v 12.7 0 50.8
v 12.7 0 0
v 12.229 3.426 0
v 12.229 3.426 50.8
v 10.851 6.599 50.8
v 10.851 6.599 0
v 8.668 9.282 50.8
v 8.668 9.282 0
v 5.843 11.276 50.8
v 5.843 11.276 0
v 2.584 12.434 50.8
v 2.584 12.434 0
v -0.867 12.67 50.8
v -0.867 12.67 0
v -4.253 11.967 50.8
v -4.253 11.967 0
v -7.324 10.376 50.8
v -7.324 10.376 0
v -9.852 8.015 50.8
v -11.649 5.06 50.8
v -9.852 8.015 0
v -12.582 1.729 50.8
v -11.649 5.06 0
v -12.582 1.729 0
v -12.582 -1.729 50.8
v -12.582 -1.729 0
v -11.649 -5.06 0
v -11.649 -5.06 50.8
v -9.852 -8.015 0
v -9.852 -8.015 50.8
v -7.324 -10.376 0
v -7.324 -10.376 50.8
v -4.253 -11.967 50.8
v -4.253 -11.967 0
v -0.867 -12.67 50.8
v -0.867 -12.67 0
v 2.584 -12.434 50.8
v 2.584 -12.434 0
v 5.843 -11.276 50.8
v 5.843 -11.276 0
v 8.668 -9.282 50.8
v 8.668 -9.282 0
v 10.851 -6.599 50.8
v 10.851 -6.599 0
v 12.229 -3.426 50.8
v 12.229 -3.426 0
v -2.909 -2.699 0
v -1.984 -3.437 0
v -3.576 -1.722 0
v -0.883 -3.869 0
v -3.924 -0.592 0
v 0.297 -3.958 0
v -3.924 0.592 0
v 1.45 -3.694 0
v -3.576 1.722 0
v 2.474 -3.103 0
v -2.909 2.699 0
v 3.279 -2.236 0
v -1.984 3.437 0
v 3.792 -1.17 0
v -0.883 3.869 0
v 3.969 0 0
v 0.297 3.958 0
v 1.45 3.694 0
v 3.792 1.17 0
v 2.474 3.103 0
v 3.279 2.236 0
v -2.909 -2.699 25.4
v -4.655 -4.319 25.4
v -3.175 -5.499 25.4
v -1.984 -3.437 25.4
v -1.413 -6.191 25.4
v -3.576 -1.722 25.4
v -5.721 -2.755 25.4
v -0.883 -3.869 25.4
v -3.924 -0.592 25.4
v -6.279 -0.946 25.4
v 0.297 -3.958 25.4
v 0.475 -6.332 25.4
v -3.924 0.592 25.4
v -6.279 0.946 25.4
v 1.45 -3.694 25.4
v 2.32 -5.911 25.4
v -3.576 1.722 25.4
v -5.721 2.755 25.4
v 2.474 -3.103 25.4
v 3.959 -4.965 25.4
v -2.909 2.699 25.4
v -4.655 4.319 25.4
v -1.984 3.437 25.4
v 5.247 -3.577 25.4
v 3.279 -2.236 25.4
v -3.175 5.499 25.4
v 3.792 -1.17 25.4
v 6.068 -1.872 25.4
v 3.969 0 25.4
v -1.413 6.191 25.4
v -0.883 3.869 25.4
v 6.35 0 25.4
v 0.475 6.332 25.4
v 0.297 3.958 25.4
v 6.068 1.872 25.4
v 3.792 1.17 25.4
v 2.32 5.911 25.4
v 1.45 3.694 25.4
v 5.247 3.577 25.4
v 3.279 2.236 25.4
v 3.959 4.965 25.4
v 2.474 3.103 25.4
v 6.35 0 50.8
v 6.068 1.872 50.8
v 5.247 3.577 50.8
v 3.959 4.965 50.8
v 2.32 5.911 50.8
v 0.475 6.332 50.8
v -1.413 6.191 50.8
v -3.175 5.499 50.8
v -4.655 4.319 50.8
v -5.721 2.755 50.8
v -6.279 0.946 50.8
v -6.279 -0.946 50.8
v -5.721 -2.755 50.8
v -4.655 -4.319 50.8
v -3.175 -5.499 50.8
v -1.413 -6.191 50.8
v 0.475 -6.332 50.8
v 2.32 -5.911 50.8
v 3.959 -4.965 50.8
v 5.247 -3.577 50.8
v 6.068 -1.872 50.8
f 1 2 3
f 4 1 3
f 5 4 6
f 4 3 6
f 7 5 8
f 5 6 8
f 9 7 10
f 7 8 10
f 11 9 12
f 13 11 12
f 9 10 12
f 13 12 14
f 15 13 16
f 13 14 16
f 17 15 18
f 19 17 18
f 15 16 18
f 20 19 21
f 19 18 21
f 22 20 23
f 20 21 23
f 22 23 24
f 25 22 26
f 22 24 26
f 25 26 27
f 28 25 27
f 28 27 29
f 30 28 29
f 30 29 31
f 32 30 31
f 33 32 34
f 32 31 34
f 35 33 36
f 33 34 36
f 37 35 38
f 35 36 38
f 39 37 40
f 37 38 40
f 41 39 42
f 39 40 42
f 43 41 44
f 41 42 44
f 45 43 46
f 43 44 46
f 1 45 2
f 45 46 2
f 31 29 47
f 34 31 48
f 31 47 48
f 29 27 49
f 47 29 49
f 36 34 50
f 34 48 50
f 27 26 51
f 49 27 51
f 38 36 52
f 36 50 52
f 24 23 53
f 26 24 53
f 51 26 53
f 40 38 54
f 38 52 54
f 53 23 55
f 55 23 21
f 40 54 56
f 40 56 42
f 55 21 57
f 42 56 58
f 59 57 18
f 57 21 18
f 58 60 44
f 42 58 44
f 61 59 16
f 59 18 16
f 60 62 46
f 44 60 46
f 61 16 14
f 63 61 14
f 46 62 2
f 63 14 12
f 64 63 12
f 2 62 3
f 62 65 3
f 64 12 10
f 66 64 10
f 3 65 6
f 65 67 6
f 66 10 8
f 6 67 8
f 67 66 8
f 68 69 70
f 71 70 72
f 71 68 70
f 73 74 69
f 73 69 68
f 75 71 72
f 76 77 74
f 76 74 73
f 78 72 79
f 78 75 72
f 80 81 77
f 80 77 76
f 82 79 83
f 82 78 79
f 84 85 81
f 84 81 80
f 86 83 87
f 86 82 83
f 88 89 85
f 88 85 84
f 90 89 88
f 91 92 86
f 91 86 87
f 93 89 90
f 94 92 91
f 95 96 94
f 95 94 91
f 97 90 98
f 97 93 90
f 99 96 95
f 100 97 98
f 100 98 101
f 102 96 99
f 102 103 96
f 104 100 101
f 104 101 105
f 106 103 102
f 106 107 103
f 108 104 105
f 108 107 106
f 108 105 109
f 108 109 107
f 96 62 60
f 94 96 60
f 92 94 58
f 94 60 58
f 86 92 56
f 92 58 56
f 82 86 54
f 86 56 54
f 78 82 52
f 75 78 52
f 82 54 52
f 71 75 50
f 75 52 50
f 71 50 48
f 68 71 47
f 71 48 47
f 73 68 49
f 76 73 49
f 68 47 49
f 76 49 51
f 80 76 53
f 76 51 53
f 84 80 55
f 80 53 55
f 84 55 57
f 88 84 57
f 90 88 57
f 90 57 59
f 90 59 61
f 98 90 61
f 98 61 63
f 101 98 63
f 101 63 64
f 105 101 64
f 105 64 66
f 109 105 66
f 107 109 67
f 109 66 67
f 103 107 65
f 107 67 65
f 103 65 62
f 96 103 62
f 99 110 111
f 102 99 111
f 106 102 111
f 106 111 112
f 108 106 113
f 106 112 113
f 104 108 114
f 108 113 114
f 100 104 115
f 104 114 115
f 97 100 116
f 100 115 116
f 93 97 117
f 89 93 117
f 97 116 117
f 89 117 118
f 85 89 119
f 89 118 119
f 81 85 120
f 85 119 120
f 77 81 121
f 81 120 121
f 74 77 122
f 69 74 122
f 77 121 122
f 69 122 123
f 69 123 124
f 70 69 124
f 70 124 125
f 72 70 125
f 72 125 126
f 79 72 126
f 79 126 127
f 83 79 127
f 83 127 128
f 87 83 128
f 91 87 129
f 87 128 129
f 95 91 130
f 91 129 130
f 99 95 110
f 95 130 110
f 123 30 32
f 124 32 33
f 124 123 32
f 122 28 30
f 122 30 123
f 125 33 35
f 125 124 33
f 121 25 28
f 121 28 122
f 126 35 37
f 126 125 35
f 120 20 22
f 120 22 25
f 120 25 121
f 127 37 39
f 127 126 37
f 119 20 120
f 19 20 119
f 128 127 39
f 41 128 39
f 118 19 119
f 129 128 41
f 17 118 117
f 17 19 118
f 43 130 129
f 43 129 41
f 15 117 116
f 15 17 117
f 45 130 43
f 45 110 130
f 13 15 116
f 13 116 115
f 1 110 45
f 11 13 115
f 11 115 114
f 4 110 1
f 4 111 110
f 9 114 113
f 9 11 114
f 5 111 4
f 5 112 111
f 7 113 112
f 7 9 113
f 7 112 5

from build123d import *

# Parameters (mm, degrees)
F0_R     = 12.7
F1_DEPTH = 50.8
F2_DEPTH = 50.8
F3_R     = 6.35
F4_DEPTH = 25.4
F5_R     = 3.96875
F6_DEPTH = 25.4


with BuildPart() as f1:
    # F0 (on Top) → F1 (new body)
    with BuildSketch(Plane.XY):
        Circle(F0_R)
    extrude(amount=F1_DEPTH)

    # F0 (on Top) → F2 (join)
    with BuildSketch(Plane.XY):
        Circle(F0_R)
    extrude(amount=F2_DEPTH)

    # F3 (on face) → F4 (cut)
    with BuildSketch(Plane.XY.offset(50.8)):
        Circle(F3_R)
    extrude(amount=-F4_DEPTH, mode=Mode.SUBTRACT)

    # F5 (on face) → F6 (cut)
    with BuildSketch(Plane(origin=(0, 0, 0), x_dir=(1, 0, 0), z_dir=(0, 0, -1))):
        Circle(F5_R)
    extrude(amount=-F6_DEPTH, mode=Mode.SUBTRACT)


solid = f1.part
